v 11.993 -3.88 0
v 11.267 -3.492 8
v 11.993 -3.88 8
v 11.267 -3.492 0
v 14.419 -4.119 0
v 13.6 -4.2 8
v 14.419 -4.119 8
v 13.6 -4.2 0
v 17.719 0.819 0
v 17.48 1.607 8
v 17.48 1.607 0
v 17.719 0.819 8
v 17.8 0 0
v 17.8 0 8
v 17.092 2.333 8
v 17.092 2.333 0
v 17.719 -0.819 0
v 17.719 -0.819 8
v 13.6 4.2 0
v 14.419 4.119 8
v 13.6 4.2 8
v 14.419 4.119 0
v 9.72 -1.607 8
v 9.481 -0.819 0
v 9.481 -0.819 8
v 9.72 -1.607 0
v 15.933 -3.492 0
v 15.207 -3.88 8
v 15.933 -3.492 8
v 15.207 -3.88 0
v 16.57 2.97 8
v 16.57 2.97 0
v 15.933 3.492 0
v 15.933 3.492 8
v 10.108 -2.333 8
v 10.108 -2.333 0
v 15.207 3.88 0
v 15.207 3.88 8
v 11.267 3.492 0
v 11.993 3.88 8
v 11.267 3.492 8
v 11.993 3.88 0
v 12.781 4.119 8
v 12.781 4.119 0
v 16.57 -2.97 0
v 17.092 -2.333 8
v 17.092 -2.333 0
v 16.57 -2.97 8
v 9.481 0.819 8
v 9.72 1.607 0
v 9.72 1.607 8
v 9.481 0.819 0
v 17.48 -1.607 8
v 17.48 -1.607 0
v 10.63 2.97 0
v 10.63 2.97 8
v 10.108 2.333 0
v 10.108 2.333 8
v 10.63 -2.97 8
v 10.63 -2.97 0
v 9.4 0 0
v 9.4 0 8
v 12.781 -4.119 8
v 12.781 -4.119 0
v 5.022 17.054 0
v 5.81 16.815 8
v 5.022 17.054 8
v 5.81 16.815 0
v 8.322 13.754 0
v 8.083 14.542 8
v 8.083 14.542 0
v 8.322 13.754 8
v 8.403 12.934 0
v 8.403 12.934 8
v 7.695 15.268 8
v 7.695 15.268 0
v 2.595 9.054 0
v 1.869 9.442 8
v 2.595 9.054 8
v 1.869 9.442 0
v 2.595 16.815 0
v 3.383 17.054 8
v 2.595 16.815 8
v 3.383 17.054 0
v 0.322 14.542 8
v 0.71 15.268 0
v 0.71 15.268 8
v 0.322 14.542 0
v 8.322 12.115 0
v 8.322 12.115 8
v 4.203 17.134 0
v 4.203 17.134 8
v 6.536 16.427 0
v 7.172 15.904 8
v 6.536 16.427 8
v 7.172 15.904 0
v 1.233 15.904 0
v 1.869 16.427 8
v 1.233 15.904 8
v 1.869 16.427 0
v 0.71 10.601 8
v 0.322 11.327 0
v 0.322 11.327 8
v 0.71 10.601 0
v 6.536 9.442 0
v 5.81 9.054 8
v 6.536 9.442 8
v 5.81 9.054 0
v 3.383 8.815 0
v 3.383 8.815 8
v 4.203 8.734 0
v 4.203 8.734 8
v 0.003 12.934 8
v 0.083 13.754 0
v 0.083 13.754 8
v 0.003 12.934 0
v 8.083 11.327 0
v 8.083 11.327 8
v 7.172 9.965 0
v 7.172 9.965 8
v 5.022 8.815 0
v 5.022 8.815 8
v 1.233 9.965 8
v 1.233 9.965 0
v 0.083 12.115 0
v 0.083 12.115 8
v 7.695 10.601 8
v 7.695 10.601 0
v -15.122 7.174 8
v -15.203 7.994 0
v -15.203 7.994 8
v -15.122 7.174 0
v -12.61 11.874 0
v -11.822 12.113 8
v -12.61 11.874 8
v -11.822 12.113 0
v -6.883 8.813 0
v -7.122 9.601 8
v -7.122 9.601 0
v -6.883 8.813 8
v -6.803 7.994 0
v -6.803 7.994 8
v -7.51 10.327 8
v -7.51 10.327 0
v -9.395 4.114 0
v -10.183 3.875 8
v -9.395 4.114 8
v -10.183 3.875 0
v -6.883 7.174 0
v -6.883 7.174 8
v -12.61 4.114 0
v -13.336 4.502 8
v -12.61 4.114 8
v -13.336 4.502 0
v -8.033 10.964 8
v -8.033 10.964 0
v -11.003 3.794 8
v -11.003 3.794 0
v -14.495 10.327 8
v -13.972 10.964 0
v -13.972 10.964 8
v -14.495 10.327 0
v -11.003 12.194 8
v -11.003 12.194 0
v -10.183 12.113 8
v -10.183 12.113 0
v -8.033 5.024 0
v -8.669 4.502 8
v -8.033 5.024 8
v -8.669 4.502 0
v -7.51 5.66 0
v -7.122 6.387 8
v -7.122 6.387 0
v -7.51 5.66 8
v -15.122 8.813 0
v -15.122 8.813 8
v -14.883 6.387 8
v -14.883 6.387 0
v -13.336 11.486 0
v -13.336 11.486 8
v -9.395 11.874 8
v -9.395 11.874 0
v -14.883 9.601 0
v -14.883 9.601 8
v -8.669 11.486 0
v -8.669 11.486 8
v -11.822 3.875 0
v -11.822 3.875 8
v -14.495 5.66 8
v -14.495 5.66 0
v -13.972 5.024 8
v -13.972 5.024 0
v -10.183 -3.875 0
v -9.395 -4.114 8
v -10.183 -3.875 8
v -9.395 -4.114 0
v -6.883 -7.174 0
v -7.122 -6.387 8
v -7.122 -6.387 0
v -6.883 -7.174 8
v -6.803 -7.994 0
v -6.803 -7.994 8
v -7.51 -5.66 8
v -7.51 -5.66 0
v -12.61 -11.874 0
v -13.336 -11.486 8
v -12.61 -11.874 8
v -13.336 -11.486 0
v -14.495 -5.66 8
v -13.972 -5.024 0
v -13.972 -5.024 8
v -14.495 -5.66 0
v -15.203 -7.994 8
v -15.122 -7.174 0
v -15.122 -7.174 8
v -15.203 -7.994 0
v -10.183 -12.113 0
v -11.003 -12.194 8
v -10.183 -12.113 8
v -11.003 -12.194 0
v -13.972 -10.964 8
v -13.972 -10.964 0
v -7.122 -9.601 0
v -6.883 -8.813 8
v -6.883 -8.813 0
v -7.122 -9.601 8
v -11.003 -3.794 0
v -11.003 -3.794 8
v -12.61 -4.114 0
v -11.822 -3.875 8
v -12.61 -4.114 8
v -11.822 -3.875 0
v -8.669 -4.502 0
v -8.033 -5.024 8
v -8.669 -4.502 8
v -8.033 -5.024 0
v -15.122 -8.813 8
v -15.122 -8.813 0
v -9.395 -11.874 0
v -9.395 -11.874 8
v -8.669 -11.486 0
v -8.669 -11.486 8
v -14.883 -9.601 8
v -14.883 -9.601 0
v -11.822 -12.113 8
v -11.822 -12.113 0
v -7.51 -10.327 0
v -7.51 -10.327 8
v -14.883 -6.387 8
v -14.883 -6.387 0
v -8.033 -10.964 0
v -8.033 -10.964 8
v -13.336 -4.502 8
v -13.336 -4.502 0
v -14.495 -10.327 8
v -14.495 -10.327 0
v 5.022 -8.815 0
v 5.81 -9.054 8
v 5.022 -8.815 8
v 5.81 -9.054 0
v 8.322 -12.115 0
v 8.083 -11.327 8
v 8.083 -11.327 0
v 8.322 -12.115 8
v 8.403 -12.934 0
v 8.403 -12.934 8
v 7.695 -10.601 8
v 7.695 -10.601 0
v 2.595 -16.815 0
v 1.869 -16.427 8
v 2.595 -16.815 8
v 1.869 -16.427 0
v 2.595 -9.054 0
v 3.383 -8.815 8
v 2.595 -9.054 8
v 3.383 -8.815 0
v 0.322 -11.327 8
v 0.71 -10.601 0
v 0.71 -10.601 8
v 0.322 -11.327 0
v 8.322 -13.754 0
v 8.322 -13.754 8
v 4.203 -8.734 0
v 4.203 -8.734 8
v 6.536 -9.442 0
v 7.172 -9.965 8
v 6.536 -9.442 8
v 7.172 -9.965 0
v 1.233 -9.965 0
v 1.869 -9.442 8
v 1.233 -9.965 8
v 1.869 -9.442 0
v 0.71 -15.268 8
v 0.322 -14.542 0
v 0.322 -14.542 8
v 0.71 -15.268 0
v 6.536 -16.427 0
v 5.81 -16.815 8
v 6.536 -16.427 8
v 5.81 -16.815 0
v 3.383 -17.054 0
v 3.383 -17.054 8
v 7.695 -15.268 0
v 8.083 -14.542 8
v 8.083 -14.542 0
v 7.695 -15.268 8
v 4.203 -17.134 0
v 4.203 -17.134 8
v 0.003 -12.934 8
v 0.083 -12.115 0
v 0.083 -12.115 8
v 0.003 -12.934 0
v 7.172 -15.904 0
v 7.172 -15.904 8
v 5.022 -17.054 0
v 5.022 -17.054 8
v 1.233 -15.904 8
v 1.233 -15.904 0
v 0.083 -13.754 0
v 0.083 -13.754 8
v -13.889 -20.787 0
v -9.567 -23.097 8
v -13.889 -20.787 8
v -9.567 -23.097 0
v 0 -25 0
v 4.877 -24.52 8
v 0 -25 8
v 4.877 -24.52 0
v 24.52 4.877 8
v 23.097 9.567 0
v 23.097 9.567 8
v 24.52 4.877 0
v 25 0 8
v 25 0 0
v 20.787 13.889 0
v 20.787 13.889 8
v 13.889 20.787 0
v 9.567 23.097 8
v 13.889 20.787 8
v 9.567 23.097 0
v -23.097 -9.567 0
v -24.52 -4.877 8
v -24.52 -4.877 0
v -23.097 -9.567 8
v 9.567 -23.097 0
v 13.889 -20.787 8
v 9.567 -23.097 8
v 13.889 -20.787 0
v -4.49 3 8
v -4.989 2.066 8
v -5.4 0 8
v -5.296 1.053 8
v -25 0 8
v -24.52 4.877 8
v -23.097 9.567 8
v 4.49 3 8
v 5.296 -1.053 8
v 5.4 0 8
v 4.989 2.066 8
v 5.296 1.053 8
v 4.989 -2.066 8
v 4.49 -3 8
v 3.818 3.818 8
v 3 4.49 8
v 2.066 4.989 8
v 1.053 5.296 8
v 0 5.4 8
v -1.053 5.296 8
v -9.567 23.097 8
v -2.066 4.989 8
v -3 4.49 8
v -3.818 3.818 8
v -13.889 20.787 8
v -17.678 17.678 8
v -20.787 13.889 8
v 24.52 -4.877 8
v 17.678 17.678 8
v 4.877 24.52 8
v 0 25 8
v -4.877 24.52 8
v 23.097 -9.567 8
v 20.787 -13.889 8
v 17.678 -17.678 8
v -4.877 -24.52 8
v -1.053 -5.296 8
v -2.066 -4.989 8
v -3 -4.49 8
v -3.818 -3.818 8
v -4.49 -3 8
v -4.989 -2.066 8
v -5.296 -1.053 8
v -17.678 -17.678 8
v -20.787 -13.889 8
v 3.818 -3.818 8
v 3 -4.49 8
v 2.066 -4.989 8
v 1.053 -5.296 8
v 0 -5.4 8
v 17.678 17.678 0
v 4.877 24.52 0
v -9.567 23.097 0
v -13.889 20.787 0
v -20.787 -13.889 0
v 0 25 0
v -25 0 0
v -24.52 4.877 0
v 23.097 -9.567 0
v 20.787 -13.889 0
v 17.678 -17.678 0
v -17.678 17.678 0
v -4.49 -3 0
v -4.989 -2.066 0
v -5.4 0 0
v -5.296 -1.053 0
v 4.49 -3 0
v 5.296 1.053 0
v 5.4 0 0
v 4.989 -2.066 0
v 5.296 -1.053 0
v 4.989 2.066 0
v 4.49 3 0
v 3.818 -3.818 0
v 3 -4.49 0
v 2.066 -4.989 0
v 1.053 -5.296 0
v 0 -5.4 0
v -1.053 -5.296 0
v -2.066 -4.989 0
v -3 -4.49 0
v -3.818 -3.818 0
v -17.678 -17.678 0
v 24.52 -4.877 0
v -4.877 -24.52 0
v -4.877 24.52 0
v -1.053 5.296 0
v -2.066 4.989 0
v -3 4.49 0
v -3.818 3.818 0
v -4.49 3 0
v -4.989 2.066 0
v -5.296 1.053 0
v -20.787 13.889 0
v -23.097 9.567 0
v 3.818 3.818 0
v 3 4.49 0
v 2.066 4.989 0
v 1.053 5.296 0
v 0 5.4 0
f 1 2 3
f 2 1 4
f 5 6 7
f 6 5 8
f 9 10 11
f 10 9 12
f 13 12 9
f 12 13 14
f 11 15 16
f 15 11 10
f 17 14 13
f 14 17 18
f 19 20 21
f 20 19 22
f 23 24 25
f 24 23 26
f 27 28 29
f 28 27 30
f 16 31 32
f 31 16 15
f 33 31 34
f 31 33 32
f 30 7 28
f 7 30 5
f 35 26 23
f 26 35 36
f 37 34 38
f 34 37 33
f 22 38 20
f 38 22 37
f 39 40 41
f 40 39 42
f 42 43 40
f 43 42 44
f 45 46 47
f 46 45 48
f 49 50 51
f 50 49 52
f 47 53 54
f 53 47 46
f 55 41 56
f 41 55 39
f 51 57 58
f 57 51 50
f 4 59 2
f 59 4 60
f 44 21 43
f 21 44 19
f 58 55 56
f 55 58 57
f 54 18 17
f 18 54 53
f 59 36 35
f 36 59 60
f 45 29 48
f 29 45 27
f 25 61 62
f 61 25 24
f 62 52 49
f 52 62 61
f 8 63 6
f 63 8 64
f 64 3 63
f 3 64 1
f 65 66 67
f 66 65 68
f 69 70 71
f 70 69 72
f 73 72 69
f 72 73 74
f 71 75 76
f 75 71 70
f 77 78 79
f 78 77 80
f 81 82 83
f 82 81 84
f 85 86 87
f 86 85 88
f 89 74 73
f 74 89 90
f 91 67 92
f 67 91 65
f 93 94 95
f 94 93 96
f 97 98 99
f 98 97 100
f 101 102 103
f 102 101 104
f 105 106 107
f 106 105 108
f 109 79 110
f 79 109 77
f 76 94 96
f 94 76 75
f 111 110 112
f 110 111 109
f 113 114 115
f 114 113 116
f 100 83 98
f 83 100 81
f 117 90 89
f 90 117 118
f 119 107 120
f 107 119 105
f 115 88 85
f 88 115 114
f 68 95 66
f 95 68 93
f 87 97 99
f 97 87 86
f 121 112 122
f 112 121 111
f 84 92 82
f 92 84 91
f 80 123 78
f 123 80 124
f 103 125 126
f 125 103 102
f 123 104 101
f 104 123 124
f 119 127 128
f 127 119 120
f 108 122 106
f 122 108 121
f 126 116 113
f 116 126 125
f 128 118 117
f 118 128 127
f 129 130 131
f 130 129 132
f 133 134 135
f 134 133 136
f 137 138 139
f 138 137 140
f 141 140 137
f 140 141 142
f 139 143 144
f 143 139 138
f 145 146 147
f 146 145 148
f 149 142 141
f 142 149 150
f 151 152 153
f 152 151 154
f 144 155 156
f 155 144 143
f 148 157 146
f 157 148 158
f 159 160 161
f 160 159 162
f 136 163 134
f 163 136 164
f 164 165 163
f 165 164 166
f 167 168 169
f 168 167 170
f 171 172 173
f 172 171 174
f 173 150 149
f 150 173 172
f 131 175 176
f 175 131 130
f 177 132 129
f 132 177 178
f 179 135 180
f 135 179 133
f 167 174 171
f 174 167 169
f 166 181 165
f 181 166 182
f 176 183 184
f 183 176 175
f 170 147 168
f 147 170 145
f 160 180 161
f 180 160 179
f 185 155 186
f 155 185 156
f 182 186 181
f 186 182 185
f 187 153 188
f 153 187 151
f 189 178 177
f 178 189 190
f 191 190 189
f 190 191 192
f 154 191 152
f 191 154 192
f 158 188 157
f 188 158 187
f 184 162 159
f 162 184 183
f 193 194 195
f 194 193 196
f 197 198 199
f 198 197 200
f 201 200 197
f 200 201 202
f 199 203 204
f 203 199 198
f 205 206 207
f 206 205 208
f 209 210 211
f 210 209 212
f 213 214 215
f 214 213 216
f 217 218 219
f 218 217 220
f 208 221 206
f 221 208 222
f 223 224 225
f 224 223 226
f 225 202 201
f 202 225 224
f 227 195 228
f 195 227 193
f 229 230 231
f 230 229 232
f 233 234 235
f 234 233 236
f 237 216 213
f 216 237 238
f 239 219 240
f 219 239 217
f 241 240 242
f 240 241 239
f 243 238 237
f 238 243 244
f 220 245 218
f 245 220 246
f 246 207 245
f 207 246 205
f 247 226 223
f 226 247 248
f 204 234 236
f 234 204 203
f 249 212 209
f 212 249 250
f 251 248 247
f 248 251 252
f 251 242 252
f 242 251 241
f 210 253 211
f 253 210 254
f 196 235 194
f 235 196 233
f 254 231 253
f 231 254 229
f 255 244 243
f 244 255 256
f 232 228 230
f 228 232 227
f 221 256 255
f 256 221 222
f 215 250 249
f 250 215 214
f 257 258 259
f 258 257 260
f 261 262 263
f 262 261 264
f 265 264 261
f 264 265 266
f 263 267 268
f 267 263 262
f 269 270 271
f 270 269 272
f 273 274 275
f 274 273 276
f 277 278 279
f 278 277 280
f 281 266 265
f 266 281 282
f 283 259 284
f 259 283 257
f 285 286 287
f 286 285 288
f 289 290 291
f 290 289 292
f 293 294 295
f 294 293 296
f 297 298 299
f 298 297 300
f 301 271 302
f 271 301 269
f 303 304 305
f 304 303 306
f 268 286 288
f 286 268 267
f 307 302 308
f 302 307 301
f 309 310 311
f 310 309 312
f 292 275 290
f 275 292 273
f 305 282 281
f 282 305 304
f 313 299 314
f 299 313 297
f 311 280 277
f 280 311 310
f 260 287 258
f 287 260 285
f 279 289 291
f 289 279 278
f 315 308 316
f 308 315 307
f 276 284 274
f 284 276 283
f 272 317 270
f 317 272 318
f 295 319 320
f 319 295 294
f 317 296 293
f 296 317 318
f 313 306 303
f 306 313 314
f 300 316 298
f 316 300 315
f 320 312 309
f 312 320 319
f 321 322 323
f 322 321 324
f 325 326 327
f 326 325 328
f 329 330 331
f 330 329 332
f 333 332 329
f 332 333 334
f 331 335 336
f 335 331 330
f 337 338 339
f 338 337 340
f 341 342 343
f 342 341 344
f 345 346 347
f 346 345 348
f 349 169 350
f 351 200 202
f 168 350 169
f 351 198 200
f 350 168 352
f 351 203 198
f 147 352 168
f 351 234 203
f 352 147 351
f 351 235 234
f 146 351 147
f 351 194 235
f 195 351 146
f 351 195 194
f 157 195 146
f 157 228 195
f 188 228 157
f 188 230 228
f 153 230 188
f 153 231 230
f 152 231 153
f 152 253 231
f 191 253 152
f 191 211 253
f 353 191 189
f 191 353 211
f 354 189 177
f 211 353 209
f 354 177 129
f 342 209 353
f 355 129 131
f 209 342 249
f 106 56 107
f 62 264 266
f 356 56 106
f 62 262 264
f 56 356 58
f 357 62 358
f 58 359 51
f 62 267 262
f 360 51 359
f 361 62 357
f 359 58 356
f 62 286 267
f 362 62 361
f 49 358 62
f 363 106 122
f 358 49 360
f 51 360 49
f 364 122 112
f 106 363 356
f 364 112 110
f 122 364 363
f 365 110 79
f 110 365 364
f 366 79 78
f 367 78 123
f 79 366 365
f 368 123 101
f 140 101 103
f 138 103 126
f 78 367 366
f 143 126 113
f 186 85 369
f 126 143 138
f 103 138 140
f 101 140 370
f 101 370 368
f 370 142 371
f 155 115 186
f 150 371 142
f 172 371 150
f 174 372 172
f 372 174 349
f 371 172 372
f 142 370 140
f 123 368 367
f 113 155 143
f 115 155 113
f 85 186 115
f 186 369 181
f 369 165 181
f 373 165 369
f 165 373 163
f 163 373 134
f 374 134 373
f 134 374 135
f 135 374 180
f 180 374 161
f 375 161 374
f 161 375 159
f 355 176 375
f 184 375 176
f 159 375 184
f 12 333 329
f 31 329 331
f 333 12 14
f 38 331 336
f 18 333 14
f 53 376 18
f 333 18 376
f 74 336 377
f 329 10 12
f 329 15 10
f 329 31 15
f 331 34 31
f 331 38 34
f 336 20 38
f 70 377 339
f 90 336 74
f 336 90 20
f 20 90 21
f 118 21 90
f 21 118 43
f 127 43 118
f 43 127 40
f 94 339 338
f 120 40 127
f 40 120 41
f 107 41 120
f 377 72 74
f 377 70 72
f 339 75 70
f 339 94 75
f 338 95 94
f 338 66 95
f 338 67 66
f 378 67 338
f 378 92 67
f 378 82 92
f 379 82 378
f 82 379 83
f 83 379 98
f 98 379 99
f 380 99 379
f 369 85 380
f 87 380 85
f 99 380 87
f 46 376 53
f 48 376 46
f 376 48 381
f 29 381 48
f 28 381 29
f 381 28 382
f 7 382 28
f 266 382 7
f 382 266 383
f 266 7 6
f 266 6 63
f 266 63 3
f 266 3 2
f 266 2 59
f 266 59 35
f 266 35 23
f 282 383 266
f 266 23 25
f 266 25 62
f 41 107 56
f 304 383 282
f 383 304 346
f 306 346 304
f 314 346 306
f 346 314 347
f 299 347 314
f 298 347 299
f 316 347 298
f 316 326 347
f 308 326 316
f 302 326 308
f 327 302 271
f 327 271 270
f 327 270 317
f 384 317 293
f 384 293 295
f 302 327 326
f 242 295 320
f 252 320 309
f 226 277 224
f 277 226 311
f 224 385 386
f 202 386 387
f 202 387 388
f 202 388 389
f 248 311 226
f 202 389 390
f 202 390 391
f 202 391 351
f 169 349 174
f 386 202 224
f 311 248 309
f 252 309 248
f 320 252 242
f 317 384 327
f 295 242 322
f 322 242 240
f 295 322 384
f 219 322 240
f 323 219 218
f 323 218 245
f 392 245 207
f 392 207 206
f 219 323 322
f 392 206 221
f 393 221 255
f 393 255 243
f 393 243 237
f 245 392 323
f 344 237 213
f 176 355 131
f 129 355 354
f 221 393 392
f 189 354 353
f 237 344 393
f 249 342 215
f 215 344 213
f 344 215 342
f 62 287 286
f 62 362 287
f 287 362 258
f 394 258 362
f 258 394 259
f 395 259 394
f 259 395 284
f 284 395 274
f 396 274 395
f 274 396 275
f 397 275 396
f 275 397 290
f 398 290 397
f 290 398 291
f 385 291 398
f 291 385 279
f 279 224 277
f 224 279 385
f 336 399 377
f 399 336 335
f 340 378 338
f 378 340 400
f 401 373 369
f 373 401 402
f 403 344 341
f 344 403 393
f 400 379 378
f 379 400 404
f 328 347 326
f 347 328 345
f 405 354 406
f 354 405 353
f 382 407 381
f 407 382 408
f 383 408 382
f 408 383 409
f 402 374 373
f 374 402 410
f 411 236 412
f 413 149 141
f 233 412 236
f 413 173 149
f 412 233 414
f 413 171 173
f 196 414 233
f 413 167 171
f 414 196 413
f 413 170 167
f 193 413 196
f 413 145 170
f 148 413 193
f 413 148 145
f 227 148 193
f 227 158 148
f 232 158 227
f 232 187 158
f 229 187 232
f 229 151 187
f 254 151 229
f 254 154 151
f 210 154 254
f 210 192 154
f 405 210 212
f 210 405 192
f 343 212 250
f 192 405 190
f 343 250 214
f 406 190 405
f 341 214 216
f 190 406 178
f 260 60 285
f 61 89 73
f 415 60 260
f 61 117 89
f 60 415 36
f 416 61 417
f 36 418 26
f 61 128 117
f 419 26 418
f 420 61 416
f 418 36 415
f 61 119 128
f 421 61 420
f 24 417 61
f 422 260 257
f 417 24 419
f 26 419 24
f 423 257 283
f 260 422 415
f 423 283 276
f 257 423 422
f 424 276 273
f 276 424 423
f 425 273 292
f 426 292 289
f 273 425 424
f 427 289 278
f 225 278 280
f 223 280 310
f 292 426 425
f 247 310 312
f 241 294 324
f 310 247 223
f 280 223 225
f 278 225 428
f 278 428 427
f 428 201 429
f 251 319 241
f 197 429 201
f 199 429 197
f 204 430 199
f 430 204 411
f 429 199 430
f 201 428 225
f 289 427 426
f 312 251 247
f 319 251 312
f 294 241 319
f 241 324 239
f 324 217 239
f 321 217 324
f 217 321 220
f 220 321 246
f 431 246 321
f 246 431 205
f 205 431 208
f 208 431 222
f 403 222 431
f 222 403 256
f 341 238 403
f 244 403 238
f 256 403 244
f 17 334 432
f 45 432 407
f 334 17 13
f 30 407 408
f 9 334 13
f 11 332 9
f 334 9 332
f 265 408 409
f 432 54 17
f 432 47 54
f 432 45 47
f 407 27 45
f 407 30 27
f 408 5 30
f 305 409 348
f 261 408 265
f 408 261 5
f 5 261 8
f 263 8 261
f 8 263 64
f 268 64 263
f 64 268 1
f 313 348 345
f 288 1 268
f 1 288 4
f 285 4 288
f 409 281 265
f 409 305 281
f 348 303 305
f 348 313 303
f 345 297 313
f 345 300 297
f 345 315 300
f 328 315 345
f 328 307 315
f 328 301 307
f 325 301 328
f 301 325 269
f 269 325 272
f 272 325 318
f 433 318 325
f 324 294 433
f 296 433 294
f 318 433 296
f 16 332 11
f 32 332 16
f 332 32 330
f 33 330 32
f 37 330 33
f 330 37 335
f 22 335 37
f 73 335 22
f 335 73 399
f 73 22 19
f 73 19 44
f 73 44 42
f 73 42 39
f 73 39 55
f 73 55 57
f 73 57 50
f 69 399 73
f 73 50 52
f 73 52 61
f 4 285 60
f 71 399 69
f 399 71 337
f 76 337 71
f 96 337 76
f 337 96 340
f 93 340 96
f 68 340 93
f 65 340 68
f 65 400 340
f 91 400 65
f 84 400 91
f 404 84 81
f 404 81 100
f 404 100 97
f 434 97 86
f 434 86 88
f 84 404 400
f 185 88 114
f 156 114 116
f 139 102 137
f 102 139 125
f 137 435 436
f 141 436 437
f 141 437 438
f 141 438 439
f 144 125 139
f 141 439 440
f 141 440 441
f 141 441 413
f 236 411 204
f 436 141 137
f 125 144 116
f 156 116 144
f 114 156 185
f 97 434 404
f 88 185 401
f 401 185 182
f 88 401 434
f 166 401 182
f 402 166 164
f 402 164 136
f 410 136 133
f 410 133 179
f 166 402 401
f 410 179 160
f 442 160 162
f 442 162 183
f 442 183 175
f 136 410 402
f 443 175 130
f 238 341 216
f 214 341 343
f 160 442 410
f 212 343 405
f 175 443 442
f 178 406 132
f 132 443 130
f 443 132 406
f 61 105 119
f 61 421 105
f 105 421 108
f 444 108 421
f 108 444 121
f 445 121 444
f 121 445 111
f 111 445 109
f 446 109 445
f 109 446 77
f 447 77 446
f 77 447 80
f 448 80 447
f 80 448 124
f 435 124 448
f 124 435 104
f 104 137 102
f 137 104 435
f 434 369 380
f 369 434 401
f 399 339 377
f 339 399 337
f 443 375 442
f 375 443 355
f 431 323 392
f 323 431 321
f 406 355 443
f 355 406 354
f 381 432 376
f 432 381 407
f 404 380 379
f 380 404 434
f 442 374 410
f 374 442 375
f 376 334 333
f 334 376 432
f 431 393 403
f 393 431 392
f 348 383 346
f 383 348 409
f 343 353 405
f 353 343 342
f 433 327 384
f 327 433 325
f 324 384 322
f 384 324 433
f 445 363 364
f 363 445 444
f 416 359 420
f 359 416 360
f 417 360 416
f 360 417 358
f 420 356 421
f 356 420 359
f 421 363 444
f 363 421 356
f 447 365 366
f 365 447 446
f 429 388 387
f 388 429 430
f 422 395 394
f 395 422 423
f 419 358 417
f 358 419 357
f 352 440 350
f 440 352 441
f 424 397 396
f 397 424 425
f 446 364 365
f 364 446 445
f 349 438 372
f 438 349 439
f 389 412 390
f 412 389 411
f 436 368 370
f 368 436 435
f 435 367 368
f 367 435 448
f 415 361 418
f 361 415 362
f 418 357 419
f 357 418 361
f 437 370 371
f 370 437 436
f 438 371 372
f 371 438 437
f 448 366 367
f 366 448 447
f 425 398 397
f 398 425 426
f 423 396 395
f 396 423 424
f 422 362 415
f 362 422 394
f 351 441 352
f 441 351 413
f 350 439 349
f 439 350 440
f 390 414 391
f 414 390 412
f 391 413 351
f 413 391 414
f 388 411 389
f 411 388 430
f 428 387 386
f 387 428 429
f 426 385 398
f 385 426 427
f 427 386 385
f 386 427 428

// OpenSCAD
$fn = 32;

// ----------------------------------------------------------------------
// Flange Ø50 x 8
// 5 holes on a Ø27.2 bolt circle, bolted joints
// ----------------------------------------------------------------------

// --- parameters (mm) ---
flange_d = 50;  // outside diameter of the flange
thickness = 8;  // flange thickness
holes = 5;      // number of bolt holes
pcd = 27.2;     // bolt circle diameter
start_deg = 0;  // angle of the first hole, from +X
hole_d = 8.4;   // bolt hole diameter
bore_d = 10.8;  // central through bore
hub_d = 18.8;   // hub outside diameter
hub_h = 0;      // hub height above the flange face (0 = no hub)

// --- derived feature positions (mm) ---
height = thickness + hub_h;  // = 8   overall height of the part
pcd_r = pcd / 2;             // = 13.6   bolt circle radius
hole_step = 360 / holes;     // = 72   angular pitch
feature_centers = [
  [pcd_r * cos(start_deg + 0 * hole_step), pcd_r * sin(start_deg + 0 * hole_step)],
  [pcd_r * cos(start_deg + 1 * hole_step), pcd_r * sin(start_deg + 1 * hole_step)],
  [pcd_r * cos(start_deg + 2 * hole_step), pcd_r * sin(start_deg + 2 * hole_step)],
  [pcd_r * cos(start_deg + 3 * hole_step), pcd_r * sin(start_deg + 3 * hole_step)],
  [pcd_r * cos(start_deg + 4 * hole_step), pcd_r * sin(start_deg + 4 * hole_step)]
];   // bolt hole centres on the pitch circle

// flange disc, every hole and the bore cut straight through
difference() {
  union() {
    cylinder(d = flange_d, h = thickness);
  }
  translate([0, 0, -1]) cylinder(d = bore_d, h = height + 2);  // bore, through
  for (centre = feature_centers)
    translate([centre[0], centre[1], -1]) cylinder(d = hole_d, h = thickness + 2);
}
